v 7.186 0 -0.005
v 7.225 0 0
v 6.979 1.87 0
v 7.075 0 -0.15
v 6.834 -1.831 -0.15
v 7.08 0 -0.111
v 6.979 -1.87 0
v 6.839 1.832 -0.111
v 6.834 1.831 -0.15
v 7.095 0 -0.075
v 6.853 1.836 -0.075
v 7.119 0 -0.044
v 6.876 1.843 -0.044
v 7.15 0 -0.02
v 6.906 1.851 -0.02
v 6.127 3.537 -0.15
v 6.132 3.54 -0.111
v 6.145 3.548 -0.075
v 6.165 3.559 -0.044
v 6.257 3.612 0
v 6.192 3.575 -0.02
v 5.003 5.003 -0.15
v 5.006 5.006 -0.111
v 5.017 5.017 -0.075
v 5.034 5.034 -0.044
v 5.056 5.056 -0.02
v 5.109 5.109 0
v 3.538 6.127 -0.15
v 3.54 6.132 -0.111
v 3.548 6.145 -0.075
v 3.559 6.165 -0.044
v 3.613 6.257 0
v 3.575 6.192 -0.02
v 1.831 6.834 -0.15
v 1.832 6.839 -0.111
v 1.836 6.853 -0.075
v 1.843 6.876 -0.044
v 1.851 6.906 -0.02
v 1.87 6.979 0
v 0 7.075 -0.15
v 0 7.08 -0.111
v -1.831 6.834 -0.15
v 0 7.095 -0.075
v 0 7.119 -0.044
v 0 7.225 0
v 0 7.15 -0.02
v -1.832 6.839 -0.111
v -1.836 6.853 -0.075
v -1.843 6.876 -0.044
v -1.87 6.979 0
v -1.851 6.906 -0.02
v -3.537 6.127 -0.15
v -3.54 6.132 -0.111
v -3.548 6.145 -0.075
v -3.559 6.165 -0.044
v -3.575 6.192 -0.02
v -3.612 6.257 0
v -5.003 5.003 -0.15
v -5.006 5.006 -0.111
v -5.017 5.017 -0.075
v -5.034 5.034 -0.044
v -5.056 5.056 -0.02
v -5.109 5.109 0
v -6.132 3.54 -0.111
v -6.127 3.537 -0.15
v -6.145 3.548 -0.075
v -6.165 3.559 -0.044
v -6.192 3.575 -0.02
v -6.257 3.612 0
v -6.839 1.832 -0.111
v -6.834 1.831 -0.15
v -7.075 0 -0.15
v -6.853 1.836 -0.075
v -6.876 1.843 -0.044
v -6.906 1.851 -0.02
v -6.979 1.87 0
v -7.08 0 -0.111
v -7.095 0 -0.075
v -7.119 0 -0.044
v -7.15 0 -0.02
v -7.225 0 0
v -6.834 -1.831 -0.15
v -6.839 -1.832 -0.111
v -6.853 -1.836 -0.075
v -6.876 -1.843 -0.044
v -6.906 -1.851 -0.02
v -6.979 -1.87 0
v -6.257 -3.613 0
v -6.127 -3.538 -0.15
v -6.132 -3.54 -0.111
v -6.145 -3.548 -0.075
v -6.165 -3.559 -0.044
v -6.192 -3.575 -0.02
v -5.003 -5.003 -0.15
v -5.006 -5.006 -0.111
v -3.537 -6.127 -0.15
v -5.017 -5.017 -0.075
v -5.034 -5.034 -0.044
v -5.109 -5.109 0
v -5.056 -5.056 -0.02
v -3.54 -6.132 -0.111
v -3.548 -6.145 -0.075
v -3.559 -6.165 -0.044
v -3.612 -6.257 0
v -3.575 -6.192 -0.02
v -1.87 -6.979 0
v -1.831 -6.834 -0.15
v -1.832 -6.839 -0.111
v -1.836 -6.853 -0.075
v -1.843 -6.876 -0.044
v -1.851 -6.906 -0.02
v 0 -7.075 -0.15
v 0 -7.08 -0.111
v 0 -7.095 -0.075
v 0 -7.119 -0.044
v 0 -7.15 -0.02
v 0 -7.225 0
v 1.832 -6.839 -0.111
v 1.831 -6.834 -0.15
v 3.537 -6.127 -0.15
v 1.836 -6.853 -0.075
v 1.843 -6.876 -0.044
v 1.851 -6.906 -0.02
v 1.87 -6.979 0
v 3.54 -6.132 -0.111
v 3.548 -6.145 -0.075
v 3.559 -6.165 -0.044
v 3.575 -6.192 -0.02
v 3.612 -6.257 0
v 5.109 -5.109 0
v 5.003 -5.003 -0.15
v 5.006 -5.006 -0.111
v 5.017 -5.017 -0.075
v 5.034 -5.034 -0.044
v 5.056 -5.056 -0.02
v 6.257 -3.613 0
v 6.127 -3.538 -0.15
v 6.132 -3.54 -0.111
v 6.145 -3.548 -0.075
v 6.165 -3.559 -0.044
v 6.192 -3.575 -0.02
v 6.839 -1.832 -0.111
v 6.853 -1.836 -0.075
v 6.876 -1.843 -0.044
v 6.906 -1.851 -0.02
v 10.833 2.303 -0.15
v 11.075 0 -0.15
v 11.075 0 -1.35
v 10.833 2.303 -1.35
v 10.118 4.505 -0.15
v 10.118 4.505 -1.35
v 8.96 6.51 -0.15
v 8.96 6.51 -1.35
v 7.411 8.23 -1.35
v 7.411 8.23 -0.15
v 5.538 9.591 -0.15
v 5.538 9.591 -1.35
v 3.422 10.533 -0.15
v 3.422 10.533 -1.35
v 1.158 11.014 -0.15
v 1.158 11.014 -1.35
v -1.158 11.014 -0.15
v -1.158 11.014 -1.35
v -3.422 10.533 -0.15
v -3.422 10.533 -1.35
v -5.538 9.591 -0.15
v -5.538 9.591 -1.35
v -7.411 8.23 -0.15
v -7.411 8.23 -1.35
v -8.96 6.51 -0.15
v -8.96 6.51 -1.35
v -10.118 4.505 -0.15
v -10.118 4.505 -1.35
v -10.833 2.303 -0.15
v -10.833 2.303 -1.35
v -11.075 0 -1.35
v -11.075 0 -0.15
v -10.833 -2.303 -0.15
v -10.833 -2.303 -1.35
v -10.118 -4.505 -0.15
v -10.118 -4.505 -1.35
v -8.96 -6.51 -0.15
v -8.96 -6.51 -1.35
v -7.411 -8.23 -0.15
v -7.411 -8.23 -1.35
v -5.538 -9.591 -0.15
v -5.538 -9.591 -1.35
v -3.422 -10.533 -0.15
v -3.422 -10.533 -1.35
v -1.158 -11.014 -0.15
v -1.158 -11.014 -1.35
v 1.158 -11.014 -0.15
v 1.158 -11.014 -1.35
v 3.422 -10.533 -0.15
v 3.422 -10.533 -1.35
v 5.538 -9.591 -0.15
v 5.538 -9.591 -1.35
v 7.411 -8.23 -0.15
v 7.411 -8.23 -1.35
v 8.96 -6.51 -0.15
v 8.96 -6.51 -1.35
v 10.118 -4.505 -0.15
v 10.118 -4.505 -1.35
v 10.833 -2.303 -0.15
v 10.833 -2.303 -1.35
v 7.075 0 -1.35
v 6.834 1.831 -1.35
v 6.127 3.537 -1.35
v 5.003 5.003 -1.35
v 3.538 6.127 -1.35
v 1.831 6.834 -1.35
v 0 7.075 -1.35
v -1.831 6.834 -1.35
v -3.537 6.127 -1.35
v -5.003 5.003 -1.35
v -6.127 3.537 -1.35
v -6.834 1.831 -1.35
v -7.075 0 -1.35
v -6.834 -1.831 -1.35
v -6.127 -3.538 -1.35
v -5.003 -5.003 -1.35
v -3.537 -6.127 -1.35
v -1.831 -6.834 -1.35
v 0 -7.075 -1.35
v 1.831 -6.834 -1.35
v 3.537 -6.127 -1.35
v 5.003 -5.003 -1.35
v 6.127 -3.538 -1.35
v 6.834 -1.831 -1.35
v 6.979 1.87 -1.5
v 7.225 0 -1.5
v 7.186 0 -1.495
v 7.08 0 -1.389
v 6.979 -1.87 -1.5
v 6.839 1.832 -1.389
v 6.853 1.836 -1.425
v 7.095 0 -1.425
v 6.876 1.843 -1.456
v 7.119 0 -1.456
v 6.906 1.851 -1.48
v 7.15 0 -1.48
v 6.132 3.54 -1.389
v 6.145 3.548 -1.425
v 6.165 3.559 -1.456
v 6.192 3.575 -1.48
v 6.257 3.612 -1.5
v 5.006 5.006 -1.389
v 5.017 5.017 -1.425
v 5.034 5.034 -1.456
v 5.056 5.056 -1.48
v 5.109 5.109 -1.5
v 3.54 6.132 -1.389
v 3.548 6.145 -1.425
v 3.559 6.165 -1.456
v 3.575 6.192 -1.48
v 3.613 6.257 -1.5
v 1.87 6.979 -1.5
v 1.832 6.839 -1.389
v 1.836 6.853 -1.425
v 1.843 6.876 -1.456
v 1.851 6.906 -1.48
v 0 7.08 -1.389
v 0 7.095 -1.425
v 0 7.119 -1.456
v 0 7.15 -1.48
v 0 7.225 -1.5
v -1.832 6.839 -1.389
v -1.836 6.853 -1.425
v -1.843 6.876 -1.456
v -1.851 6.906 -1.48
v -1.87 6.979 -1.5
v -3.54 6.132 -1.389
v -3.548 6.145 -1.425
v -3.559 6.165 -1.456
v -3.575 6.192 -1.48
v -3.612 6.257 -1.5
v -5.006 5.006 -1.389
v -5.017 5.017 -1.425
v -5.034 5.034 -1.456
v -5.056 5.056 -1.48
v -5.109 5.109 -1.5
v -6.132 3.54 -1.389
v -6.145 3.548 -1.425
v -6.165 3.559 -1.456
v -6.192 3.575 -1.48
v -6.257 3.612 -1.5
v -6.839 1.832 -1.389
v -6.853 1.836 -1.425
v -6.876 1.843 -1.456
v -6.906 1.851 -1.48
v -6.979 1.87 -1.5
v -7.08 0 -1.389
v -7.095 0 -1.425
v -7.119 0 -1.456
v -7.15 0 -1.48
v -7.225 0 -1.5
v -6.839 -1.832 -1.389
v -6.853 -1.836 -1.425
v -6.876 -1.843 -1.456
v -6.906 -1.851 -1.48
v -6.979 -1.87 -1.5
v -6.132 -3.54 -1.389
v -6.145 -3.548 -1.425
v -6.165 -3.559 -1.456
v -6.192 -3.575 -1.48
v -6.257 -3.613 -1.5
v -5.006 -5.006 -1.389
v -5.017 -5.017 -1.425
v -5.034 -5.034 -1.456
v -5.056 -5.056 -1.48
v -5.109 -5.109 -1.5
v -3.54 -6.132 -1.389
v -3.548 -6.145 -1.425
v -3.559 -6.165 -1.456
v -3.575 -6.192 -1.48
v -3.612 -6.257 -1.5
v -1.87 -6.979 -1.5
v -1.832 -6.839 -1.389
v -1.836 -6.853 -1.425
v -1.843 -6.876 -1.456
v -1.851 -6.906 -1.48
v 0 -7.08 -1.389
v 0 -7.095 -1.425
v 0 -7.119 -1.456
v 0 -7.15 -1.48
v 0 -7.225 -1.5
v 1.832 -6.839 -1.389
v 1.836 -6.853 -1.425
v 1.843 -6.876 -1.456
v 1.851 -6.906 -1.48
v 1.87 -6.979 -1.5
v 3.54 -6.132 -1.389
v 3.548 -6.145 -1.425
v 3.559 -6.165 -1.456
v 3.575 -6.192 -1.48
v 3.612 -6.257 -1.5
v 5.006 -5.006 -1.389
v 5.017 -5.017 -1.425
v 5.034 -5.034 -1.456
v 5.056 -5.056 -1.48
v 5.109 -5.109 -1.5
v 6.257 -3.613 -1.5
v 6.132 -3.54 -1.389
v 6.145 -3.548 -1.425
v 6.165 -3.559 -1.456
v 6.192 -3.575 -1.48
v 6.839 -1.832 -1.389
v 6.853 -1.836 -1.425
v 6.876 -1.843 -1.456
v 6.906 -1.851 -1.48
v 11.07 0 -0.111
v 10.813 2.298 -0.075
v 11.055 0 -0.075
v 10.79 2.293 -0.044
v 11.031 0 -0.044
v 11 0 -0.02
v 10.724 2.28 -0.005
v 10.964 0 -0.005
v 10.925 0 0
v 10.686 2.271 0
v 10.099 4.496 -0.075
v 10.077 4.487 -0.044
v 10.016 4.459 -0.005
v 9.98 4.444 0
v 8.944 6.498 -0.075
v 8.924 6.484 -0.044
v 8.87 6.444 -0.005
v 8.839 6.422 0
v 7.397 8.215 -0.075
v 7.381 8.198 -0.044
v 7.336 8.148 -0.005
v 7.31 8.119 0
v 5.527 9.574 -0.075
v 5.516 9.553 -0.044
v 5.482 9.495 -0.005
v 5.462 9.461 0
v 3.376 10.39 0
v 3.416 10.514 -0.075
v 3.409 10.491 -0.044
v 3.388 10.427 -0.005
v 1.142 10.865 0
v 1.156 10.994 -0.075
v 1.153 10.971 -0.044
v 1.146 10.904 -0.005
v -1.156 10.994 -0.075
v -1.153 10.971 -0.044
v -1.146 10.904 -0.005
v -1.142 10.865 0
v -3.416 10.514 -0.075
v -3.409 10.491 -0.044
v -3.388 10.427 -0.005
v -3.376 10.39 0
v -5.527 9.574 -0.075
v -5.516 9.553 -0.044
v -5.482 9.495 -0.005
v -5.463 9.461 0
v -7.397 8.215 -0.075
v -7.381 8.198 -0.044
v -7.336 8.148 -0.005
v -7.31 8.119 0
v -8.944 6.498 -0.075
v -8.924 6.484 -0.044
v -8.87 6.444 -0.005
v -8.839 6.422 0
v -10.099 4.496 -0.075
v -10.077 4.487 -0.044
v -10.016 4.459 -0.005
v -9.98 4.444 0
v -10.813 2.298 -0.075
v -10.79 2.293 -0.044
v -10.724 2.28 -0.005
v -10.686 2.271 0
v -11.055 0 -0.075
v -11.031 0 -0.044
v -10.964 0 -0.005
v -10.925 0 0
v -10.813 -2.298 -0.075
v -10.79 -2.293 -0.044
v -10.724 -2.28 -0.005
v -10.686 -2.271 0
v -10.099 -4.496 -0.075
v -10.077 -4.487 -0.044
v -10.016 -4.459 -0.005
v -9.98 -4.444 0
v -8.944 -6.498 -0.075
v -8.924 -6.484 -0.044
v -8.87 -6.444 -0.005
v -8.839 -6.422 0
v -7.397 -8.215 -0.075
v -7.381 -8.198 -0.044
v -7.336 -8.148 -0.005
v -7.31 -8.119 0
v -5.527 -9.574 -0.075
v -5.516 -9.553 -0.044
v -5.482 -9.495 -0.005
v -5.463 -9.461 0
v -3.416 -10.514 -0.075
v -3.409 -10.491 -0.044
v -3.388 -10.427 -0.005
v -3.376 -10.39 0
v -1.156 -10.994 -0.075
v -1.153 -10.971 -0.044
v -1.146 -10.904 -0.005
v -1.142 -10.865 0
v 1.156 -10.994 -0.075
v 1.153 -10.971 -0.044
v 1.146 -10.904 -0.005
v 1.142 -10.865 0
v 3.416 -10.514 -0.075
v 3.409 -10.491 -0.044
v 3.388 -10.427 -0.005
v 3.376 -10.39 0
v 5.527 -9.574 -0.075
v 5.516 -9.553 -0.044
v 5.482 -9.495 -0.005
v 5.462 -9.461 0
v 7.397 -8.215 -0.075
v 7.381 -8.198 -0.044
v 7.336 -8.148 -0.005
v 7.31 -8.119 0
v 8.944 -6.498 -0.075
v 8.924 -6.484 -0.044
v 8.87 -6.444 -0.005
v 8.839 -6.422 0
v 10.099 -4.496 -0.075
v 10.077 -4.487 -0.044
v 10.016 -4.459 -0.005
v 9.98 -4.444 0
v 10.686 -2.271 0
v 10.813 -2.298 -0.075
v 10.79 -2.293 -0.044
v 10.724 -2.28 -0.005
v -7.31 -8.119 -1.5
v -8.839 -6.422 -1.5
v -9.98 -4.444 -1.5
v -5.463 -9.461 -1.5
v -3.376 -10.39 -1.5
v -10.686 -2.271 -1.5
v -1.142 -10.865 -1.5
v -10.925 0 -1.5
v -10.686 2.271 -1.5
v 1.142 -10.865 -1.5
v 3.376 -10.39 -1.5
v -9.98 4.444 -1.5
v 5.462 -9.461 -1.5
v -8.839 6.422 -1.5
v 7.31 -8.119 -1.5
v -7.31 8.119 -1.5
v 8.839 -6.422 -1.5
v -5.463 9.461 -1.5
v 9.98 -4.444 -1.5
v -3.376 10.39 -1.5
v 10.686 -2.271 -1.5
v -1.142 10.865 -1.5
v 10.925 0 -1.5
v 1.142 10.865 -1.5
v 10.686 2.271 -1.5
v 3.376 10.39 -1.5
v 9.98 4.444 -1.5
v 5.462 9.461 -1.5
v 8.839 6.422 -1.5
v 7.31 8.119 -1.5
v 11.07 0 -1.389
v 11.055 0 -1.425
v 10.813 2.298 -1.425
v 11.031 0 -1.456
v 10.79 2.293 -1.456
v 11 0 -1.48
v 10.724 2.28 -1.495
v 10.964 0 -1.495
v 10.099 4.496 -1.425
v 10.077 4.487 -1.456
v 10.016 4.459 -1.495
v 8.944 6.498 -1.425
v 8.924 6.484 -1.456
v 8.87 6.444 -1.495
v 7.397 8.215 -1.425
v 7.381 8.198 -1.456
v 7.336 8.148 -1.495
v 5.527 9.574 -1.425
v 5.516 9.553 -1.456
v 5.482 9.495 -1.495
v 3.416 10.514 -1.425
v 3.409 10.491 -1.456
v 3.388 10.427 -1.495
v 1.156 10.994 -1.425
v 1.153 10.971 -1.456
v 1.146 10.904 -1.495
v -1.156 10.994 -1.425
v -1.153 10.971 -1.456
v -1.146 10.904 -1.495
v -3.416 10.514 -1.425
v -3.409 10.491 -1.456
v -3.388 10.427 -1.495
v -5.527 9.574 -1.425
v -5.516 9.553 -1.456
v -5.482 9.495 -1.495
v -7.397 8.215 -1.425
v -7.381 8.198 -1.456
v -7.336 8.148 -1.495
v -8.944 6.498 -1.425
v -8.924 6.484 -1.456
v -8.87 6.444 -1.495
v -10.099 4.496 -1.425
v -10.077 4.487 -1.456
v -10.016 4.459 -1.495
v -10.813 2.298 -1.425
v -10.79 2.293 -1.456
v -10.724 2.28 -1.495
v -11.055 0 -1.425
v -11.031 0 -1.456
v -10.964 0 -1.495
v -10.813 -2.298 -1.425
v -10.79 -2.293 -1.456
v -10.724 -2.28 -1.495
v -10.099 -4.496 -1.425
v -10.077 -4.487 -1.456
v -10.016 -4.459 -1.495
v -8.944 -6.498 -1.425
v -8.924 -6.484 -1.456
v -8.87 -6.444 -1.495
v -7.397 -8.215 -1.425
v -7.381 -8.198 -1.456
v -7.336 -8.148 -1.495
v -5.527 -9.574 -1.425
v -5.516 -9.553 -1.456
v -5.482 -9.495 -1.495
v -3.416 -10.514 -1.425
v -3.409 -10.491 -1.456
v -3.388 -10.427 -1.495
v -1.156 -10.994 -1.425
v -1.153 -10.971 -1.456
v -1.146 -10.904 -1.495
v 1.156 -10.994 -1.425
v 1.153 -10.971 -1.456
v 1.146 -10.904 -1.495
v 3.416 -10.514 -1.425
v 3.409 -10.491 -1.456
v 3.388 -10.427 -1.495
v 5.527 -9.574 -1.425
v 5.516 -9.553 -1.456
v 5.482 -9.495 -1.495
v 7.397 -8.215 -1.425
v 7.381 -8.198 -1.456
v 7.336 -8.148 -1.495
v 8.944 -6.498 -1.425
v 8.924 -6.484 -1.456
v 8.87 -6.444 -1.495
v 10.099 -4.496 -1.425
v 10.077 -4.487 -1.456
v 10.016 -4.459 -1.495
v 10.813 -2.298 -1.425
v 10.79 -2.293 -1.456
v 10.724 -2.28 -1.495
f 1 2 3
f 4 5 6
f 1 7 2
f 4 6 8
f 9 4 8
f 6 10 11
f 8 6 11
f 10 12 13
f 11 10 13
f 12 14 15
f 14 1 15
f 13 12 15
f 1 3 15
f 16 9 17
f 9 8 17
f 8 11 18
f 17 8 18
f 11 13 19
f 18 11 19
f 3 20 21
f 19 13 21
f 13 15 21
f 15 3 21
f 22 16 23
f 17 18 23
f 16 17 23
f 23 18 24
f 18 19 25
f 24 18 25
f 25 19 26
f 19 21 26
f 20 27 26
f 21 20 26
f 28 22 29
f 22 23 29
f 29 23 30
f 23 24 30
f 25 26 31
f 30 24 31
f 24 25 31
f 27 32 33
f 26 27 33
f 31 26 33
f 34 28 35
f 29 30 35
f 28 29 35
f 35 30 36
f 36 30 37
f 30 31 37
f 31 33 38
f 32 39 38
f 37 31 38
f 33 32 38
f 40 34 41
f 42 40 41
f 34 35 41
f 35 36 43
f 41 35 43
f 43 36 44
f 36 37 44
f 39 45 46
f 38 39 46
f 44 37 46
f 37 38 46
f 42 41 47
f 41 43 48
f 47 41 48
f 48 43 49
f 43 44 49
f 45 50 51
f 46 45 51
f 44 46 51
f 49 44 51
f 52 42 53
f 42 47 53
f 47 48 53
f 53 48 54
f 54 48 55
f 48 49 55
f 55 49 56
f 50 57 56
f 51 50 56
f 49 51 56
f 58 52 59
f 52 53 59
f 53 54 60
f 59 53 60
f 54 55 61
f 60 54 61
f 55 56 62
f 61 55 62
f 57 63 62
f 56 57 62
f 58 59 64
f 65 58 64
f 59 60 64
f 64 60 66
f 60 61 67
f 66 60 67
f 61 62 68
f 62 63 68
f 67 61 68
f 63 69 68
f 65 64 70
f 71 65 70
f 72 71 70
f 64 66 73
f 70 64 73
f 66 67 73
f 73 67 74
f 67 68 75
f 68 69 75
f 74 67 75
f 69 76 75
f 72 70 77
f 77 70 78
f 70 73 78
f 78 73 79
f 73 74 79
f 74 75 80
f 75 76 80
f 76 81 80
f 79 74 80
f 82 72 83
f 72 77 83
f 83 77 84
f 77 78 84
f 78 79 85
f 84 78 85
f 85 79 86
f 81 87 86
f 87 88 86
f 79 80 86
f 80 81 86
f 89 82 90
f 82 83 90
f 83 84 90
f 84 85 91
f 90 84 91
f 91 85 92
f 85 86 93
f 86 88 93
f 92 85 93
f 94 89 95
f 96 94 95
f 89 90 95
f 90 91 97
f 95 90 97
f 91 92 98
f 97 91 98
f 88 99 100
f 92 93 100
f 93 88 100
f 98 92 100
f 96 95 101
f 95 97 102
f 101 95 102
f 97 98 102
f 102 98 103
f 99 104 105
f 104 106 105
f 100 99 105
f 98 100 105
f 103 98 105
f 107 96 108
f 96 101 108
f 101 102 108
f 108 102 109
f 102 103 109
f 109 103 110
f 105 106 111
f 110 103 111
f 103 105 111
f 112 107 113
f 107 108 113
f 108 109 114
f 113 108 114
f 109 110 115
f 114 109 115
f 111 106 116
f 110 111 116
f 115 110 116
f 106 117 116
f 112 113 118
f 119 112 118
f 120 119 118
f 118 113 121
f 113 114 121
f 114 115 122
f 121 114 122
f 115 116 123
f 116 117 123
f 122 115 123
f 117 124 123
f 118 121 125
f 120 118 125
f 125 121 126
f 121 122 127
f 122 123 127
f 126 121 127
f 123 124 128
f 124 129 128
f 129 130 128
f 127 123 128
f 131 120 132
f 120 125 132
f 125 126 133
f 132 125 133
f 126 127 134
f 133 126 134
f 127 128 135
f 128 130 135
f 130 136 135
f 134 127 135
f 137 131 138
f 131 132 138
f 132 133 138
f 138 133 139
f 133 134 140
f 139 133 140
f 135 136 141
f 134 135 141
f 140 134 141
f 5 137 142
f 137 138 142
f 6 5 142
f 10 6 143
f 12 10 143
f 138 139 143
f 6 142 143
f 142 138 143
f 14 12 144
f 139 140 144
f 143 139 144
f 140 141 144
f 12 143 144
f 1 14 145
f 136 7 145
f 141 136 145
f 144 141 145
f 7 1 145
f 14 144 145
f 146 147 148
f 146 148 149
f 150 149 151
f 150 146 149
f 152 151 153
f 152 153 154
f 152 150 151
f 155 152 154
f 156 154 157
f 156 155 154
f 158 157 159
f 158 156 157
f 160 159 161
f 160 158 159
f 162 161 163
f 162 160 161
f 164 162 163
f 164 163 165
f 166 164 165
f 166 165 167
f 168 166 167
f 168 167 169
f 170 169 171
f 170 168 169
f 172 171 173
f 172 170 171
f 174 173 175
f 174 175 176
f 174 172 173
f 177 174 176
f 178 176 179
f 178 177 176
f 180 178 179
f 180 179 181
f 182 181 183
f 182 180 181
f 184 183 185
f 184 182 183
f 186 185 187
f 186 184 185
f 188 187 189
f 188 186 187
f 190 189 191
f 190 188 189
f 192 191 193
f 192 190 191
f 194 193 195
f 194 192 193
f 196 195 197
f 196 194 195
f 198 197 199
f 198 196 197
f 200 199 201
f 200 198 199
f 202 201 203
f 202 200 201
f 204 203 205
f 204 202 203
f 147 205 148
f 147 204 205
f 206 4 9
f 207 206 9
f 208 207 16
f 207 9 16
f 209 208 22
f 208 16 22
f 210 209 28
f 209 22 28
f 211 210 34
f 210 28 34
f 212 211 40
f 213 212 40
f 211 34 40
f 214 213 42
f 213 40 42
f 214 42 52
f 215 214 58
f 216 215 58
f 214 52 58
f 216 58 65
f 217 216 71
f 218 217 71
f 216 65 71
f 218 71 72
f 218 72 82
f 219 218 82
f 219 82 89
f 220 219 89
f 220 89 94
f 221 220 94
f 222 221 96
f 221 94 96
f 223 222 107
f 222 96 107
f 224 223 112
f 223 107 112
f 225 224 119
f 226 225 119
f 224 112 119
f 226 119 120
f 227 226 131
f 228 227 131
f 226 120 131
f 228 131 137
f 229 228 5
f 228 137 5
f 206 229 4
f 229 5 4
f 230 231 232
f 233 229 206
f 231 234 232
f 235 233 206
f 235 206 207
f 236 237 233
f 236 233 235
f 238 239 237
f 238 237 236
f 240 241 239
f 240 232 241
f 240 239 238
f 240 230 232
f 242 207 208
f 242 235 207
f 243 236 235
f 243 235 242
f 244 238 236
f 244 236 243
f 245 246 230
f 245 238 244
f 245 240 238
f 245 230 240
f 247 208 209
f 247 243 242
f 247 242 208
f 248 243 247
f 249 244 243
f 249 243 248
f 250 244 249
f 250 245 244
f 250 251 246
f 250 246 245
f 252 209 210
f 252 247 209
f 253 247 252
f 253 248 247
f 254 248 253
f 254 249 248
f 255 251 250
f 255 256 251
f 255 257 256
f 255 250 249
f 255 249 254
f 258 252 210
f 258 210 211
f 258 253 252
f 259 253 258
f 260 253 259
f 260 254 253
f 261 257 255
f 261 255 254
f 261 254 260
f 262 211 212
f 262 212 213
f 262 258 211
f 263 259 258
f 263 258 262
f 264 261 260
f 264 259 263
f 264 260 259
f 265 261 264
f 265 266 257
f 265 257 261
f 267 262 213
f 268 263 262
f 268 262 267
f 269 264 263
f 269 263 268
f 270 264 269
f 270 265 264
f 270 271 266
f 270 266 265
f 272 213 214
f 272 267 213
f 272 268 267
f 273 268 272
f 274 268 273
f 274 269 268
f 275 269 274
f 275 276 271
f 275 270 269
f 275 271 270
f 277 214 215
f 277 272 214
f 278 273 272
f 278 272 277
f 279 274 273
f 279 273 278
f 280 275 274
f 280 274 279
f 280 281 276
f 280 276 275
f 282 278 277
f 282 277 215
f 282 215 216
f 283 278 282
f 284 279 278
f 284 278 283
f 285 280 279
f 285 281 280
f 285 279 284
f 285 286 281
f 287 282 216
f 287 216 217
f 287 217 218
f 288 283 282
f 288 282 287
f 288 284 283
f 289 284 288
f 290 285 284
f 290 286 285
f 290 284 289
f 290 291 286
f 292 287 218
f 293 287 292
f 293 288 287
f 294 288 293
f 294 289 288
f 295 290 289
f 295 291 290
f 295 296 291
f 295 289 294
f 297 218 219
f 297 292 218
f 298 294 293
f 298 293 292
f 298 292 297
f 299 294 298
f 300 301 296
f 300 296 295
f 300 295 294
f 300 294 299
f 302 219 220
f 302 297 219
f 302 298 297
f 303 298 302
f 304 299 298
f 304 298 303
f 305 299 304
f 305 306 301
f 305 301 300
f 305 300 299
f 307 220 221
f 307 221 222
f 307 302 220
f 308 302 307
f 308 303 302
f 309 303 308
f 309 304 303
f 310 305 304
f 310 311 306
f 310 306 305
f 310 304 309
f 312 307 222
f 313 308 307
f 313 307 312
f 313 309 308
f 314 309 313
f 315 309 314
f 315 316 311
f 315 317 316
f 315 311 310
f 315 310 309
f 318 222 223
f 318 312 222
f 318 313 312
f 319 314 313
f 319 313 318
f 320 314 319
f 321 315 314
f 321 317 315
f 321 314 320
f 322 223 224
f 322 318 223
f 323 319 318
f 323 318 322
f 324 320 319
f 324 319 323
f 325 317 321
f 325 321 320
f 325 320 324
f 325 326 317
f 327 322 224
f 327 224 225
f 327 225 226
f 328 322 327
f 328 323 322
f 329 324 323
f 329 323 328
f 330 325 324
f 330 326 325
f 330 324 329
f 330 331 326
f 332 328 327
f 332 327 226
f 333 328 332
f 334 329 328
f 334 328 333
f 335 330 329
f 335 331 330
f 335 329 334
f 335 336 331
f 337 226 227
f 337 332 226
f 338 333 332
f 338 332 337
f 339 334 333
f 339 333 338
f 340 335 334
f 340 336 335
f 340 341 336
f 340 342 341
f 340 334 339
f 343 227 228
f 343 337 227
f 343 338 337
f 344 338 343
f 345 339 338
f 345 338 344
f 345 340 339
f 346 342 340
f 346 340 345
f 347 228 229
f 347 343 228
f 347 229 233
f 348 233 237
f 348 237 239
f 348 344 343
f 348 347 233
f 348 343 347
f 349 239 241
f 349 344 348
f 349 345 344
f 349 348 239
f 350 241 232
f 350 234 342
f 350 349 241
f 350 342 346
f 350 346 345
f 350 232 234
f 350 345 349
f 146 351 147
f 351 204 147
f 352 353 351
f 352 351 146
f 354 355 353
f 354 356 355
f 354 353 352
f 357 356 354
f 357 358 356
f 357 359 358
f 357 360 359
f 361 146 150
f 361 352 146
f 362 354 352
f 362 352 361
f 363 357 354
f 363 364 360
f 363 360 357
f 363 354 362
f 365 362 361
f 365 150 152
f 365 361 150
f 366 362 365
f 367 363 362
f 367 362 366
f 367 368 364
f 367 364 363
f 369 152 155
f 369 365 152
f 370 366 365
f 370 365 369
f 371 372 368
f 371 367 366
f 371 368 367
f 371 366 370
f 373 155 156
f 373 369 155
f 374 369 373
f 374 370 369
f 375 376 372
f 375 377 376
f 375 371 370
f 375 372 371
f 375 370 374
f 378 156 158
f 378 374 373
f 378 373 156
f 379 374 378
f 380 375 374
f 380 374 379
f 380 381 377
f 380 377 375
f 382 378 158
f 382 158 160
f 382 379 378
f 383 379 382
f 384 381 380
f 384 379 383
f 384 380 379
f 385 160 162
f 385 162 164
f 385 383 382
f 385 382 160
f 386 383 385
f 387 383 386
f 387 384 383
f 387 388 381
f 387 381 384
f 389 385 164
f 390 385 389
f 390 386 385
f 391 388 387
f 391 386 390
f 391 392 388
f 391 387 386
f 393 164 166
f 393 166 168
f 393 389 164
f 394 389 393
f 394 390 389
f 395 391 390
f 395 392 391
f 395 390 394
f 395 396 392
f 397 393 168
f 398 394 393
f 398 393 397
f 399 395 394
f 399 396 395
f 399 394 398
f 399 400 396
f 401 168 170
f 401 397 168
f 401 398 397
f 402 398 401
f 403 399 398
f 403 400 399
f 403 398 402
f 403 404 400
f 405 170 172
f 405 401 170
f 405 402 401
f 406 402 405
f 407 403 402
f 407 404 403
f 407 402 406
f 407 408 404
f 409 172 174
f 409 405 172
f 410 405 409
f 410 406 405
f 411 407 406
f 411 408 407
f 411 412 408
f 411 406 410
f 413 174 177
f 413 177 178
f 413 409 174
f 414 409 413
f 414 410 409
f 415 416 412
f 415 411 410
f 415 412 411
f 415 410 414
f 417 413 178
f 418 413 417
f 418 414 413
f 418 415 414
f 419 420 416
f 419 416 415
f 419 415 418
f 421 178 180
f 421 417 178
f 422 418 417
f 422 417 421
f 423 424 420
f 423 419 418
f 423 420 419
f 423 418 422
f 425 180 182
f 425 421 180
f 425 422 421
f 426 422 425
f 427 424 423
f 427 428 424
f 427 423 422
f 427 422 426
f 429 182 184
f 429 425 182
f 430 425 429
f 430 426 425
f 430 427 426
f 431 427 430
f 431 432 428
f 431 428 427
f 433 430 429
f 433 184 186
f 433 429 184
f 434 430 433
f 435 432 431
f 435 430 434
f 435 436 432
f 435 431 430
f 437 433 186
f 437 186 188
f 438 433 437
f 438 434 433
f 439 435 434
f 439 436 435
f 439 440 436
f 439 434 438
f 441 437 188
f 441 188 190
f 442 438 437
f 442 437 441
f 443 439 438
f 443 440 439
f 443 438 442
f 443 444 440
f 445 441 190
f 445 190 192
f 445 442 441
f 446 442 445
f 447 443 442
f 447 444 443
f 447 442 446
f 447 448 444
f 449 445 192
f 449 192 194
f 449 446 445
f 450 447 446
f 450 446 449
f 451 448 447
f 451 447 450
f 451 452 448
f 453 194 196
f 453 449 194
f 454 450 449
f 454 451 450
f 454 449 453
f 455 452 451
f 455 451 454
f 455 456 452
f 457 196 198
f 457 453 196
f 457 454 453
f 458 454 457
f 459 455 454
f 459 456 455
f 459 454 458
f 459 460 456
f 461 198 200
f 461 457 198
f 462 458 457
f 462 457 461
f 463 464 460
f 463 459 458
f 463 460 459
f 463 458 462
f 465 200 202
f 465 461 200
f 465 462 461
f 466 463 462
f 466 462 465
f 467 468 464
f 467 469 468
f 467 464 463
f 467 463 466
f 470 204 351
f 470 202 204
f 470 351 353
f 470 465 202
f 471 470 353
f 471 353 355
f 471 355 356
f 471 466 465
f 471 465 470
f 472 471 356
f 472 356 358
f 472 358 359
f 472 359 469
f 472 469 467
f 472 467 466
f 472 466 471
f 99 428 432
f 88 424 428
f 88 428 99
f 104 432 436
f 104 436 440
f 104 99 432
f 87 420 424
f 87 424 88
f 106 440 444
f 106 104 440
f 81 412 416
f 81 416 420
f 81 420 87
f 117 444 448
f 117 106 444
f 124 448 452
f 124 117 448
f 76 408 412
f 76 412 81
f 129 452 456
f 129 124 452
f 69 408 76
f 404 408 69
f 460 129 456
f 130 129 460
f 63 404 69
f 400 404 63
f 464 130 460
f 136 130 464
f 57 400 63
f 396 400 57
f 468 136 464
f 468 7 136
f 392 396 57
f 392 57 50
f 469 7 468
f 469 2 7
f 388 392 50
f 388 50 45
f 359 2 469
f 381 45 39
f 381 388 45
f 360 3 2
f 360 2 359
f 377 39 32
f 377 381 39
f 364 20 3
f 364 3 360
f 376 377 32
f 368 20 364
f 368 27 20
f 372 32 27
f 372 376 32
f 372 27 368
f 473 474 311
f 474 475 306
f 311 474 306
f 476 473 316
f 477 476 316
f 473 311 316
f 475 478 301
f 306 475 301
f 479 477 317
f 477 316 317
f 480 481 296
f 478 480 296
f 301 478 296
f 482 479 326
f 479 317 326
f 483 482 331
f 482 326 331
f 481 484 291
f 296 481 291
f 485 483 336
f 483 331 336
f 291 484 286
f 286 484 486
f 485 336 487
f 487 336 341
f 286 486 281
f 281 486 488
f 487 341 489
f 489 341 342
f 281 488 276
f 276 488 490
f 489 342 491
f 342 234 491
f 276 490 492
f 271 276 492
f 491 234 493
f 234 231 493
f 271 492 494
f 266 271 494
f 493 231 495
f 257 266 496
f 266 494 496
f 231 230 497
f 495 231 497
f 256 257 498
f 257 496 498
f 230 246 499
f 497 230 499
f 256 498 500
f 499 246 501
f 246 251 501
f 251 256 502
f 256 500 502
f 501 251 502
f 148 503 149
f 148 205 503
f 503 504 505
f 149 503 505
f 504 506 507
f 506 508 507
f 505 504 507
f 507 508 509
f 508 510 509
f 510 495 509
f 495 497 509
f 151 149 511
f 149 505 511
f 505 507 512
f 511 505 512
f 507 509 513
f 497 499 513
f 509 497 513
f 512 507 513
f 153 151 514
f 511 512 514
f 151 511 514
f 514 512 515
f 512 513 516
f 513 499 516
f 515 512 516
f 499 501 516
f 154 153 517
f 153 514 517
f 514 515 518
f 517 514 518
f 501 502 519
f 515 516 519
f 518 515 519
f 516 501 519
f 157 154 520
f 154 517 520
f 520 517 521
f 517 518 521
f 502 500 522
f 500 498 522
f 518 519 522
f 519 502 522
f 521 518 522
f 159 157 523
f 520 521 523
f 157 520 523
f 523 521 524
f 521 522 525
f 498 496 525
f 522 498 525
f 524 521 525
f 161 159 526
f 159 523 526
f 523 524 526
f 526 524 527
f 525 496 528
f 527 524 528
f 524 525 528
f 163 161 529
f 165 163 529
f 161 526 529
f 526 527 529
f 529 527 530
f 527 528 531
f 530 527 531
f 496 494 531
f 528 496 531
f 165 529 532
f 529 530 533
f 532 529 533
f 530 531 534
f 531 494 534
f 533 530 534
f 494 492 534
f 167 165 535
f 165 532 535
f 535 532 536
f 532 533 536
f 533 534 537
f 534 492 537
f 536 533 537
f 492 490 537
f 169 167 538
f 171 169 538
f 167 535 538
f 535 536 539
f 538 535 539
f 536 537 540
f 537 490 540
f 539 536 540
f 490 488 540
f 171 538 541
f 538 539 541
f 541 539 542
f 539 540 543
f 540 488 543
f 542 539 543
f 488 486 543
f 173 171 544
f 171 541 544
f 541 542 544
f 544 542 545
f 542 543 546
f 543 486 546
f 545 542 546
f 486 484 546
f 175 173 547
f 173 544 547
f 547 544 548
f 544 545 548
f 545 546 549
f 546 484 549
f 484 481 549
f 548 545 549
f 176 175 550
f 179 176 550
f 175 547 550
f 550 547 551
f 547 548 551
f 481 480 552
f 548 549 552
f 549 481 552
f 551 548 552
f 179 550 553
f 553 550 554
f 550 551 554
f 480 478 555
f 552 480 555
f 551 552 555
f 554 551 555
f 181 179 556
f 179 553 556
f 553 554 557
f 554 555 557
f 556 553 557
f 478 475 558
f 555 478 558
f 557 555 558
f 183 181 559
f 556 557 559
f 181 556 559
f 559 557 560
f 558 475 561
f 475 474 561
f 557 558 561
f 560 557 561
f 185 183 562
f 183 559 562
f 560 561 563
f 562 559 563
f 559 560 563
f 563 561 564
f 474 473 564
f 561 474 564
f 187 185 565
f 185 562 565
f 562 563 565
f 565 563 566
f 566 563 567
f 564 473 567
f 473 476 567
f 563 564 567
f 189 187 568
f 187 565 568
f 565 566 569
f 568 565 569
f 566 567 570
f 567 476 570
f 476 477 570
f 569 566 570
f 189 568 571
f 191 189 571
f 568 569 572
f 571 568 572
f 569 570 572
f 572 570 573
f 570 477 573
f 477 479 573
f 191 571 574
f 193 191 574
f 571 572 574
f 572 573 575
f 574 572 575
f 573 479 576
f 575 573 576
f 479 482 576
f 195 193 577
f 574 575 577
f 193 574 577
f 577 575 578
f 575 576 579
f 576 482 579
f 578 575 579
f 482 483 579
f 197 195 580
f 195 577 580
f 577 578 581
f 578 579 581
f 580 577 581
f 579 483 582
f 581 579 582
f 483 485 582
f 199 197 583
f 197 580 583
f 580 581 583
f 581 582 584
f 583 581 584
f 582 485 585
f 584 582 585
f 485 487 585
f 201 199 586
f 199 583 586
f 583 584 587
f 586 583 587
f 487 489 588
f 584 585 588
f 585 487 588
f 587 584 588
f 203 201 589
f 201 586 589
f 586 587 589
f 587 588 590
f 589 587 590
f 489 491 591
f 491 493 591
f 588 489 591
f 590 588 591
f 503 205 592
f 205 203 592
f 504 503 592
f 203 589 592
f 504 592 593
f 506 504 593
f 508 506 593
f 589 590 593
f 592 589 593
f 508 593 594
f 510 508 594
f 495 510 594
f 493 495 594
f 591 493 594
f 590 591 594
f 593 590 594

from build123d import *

# Parameters (mm, degrees)
SKETCH1_R          = 11.075
SKETCH1_R_2        = 7.075
BASE_FLANGE1_DEPTH = 1.5
FILLET1_R          = 0.15


# Sheet-metal steps are written as plain solids
with BuildPart() as part:
    # Sketch1 → Base-Flange1 (new body)
    with BuildSketch(Plane.XY):
        Circle(SKETCH1_R)
        Circle(SKETCH1_R_2, mode=Mode.SUBTRACT)
    extrude(amount=-BASE_FLANGE1_DEPTH)

    # Fillet1
    fillet1_edges = [part.edges().sort_by_distance(p)[0] for p in [
        (-11.075, 0, 0),
        (-11.075, 0, -1.5),
        (-7.075, 0, -1.5),
        (-7.075, 0, 0),
    ]]
    fillet(fillet1_edges, radius=FILLET1_R)


solid = part.part
